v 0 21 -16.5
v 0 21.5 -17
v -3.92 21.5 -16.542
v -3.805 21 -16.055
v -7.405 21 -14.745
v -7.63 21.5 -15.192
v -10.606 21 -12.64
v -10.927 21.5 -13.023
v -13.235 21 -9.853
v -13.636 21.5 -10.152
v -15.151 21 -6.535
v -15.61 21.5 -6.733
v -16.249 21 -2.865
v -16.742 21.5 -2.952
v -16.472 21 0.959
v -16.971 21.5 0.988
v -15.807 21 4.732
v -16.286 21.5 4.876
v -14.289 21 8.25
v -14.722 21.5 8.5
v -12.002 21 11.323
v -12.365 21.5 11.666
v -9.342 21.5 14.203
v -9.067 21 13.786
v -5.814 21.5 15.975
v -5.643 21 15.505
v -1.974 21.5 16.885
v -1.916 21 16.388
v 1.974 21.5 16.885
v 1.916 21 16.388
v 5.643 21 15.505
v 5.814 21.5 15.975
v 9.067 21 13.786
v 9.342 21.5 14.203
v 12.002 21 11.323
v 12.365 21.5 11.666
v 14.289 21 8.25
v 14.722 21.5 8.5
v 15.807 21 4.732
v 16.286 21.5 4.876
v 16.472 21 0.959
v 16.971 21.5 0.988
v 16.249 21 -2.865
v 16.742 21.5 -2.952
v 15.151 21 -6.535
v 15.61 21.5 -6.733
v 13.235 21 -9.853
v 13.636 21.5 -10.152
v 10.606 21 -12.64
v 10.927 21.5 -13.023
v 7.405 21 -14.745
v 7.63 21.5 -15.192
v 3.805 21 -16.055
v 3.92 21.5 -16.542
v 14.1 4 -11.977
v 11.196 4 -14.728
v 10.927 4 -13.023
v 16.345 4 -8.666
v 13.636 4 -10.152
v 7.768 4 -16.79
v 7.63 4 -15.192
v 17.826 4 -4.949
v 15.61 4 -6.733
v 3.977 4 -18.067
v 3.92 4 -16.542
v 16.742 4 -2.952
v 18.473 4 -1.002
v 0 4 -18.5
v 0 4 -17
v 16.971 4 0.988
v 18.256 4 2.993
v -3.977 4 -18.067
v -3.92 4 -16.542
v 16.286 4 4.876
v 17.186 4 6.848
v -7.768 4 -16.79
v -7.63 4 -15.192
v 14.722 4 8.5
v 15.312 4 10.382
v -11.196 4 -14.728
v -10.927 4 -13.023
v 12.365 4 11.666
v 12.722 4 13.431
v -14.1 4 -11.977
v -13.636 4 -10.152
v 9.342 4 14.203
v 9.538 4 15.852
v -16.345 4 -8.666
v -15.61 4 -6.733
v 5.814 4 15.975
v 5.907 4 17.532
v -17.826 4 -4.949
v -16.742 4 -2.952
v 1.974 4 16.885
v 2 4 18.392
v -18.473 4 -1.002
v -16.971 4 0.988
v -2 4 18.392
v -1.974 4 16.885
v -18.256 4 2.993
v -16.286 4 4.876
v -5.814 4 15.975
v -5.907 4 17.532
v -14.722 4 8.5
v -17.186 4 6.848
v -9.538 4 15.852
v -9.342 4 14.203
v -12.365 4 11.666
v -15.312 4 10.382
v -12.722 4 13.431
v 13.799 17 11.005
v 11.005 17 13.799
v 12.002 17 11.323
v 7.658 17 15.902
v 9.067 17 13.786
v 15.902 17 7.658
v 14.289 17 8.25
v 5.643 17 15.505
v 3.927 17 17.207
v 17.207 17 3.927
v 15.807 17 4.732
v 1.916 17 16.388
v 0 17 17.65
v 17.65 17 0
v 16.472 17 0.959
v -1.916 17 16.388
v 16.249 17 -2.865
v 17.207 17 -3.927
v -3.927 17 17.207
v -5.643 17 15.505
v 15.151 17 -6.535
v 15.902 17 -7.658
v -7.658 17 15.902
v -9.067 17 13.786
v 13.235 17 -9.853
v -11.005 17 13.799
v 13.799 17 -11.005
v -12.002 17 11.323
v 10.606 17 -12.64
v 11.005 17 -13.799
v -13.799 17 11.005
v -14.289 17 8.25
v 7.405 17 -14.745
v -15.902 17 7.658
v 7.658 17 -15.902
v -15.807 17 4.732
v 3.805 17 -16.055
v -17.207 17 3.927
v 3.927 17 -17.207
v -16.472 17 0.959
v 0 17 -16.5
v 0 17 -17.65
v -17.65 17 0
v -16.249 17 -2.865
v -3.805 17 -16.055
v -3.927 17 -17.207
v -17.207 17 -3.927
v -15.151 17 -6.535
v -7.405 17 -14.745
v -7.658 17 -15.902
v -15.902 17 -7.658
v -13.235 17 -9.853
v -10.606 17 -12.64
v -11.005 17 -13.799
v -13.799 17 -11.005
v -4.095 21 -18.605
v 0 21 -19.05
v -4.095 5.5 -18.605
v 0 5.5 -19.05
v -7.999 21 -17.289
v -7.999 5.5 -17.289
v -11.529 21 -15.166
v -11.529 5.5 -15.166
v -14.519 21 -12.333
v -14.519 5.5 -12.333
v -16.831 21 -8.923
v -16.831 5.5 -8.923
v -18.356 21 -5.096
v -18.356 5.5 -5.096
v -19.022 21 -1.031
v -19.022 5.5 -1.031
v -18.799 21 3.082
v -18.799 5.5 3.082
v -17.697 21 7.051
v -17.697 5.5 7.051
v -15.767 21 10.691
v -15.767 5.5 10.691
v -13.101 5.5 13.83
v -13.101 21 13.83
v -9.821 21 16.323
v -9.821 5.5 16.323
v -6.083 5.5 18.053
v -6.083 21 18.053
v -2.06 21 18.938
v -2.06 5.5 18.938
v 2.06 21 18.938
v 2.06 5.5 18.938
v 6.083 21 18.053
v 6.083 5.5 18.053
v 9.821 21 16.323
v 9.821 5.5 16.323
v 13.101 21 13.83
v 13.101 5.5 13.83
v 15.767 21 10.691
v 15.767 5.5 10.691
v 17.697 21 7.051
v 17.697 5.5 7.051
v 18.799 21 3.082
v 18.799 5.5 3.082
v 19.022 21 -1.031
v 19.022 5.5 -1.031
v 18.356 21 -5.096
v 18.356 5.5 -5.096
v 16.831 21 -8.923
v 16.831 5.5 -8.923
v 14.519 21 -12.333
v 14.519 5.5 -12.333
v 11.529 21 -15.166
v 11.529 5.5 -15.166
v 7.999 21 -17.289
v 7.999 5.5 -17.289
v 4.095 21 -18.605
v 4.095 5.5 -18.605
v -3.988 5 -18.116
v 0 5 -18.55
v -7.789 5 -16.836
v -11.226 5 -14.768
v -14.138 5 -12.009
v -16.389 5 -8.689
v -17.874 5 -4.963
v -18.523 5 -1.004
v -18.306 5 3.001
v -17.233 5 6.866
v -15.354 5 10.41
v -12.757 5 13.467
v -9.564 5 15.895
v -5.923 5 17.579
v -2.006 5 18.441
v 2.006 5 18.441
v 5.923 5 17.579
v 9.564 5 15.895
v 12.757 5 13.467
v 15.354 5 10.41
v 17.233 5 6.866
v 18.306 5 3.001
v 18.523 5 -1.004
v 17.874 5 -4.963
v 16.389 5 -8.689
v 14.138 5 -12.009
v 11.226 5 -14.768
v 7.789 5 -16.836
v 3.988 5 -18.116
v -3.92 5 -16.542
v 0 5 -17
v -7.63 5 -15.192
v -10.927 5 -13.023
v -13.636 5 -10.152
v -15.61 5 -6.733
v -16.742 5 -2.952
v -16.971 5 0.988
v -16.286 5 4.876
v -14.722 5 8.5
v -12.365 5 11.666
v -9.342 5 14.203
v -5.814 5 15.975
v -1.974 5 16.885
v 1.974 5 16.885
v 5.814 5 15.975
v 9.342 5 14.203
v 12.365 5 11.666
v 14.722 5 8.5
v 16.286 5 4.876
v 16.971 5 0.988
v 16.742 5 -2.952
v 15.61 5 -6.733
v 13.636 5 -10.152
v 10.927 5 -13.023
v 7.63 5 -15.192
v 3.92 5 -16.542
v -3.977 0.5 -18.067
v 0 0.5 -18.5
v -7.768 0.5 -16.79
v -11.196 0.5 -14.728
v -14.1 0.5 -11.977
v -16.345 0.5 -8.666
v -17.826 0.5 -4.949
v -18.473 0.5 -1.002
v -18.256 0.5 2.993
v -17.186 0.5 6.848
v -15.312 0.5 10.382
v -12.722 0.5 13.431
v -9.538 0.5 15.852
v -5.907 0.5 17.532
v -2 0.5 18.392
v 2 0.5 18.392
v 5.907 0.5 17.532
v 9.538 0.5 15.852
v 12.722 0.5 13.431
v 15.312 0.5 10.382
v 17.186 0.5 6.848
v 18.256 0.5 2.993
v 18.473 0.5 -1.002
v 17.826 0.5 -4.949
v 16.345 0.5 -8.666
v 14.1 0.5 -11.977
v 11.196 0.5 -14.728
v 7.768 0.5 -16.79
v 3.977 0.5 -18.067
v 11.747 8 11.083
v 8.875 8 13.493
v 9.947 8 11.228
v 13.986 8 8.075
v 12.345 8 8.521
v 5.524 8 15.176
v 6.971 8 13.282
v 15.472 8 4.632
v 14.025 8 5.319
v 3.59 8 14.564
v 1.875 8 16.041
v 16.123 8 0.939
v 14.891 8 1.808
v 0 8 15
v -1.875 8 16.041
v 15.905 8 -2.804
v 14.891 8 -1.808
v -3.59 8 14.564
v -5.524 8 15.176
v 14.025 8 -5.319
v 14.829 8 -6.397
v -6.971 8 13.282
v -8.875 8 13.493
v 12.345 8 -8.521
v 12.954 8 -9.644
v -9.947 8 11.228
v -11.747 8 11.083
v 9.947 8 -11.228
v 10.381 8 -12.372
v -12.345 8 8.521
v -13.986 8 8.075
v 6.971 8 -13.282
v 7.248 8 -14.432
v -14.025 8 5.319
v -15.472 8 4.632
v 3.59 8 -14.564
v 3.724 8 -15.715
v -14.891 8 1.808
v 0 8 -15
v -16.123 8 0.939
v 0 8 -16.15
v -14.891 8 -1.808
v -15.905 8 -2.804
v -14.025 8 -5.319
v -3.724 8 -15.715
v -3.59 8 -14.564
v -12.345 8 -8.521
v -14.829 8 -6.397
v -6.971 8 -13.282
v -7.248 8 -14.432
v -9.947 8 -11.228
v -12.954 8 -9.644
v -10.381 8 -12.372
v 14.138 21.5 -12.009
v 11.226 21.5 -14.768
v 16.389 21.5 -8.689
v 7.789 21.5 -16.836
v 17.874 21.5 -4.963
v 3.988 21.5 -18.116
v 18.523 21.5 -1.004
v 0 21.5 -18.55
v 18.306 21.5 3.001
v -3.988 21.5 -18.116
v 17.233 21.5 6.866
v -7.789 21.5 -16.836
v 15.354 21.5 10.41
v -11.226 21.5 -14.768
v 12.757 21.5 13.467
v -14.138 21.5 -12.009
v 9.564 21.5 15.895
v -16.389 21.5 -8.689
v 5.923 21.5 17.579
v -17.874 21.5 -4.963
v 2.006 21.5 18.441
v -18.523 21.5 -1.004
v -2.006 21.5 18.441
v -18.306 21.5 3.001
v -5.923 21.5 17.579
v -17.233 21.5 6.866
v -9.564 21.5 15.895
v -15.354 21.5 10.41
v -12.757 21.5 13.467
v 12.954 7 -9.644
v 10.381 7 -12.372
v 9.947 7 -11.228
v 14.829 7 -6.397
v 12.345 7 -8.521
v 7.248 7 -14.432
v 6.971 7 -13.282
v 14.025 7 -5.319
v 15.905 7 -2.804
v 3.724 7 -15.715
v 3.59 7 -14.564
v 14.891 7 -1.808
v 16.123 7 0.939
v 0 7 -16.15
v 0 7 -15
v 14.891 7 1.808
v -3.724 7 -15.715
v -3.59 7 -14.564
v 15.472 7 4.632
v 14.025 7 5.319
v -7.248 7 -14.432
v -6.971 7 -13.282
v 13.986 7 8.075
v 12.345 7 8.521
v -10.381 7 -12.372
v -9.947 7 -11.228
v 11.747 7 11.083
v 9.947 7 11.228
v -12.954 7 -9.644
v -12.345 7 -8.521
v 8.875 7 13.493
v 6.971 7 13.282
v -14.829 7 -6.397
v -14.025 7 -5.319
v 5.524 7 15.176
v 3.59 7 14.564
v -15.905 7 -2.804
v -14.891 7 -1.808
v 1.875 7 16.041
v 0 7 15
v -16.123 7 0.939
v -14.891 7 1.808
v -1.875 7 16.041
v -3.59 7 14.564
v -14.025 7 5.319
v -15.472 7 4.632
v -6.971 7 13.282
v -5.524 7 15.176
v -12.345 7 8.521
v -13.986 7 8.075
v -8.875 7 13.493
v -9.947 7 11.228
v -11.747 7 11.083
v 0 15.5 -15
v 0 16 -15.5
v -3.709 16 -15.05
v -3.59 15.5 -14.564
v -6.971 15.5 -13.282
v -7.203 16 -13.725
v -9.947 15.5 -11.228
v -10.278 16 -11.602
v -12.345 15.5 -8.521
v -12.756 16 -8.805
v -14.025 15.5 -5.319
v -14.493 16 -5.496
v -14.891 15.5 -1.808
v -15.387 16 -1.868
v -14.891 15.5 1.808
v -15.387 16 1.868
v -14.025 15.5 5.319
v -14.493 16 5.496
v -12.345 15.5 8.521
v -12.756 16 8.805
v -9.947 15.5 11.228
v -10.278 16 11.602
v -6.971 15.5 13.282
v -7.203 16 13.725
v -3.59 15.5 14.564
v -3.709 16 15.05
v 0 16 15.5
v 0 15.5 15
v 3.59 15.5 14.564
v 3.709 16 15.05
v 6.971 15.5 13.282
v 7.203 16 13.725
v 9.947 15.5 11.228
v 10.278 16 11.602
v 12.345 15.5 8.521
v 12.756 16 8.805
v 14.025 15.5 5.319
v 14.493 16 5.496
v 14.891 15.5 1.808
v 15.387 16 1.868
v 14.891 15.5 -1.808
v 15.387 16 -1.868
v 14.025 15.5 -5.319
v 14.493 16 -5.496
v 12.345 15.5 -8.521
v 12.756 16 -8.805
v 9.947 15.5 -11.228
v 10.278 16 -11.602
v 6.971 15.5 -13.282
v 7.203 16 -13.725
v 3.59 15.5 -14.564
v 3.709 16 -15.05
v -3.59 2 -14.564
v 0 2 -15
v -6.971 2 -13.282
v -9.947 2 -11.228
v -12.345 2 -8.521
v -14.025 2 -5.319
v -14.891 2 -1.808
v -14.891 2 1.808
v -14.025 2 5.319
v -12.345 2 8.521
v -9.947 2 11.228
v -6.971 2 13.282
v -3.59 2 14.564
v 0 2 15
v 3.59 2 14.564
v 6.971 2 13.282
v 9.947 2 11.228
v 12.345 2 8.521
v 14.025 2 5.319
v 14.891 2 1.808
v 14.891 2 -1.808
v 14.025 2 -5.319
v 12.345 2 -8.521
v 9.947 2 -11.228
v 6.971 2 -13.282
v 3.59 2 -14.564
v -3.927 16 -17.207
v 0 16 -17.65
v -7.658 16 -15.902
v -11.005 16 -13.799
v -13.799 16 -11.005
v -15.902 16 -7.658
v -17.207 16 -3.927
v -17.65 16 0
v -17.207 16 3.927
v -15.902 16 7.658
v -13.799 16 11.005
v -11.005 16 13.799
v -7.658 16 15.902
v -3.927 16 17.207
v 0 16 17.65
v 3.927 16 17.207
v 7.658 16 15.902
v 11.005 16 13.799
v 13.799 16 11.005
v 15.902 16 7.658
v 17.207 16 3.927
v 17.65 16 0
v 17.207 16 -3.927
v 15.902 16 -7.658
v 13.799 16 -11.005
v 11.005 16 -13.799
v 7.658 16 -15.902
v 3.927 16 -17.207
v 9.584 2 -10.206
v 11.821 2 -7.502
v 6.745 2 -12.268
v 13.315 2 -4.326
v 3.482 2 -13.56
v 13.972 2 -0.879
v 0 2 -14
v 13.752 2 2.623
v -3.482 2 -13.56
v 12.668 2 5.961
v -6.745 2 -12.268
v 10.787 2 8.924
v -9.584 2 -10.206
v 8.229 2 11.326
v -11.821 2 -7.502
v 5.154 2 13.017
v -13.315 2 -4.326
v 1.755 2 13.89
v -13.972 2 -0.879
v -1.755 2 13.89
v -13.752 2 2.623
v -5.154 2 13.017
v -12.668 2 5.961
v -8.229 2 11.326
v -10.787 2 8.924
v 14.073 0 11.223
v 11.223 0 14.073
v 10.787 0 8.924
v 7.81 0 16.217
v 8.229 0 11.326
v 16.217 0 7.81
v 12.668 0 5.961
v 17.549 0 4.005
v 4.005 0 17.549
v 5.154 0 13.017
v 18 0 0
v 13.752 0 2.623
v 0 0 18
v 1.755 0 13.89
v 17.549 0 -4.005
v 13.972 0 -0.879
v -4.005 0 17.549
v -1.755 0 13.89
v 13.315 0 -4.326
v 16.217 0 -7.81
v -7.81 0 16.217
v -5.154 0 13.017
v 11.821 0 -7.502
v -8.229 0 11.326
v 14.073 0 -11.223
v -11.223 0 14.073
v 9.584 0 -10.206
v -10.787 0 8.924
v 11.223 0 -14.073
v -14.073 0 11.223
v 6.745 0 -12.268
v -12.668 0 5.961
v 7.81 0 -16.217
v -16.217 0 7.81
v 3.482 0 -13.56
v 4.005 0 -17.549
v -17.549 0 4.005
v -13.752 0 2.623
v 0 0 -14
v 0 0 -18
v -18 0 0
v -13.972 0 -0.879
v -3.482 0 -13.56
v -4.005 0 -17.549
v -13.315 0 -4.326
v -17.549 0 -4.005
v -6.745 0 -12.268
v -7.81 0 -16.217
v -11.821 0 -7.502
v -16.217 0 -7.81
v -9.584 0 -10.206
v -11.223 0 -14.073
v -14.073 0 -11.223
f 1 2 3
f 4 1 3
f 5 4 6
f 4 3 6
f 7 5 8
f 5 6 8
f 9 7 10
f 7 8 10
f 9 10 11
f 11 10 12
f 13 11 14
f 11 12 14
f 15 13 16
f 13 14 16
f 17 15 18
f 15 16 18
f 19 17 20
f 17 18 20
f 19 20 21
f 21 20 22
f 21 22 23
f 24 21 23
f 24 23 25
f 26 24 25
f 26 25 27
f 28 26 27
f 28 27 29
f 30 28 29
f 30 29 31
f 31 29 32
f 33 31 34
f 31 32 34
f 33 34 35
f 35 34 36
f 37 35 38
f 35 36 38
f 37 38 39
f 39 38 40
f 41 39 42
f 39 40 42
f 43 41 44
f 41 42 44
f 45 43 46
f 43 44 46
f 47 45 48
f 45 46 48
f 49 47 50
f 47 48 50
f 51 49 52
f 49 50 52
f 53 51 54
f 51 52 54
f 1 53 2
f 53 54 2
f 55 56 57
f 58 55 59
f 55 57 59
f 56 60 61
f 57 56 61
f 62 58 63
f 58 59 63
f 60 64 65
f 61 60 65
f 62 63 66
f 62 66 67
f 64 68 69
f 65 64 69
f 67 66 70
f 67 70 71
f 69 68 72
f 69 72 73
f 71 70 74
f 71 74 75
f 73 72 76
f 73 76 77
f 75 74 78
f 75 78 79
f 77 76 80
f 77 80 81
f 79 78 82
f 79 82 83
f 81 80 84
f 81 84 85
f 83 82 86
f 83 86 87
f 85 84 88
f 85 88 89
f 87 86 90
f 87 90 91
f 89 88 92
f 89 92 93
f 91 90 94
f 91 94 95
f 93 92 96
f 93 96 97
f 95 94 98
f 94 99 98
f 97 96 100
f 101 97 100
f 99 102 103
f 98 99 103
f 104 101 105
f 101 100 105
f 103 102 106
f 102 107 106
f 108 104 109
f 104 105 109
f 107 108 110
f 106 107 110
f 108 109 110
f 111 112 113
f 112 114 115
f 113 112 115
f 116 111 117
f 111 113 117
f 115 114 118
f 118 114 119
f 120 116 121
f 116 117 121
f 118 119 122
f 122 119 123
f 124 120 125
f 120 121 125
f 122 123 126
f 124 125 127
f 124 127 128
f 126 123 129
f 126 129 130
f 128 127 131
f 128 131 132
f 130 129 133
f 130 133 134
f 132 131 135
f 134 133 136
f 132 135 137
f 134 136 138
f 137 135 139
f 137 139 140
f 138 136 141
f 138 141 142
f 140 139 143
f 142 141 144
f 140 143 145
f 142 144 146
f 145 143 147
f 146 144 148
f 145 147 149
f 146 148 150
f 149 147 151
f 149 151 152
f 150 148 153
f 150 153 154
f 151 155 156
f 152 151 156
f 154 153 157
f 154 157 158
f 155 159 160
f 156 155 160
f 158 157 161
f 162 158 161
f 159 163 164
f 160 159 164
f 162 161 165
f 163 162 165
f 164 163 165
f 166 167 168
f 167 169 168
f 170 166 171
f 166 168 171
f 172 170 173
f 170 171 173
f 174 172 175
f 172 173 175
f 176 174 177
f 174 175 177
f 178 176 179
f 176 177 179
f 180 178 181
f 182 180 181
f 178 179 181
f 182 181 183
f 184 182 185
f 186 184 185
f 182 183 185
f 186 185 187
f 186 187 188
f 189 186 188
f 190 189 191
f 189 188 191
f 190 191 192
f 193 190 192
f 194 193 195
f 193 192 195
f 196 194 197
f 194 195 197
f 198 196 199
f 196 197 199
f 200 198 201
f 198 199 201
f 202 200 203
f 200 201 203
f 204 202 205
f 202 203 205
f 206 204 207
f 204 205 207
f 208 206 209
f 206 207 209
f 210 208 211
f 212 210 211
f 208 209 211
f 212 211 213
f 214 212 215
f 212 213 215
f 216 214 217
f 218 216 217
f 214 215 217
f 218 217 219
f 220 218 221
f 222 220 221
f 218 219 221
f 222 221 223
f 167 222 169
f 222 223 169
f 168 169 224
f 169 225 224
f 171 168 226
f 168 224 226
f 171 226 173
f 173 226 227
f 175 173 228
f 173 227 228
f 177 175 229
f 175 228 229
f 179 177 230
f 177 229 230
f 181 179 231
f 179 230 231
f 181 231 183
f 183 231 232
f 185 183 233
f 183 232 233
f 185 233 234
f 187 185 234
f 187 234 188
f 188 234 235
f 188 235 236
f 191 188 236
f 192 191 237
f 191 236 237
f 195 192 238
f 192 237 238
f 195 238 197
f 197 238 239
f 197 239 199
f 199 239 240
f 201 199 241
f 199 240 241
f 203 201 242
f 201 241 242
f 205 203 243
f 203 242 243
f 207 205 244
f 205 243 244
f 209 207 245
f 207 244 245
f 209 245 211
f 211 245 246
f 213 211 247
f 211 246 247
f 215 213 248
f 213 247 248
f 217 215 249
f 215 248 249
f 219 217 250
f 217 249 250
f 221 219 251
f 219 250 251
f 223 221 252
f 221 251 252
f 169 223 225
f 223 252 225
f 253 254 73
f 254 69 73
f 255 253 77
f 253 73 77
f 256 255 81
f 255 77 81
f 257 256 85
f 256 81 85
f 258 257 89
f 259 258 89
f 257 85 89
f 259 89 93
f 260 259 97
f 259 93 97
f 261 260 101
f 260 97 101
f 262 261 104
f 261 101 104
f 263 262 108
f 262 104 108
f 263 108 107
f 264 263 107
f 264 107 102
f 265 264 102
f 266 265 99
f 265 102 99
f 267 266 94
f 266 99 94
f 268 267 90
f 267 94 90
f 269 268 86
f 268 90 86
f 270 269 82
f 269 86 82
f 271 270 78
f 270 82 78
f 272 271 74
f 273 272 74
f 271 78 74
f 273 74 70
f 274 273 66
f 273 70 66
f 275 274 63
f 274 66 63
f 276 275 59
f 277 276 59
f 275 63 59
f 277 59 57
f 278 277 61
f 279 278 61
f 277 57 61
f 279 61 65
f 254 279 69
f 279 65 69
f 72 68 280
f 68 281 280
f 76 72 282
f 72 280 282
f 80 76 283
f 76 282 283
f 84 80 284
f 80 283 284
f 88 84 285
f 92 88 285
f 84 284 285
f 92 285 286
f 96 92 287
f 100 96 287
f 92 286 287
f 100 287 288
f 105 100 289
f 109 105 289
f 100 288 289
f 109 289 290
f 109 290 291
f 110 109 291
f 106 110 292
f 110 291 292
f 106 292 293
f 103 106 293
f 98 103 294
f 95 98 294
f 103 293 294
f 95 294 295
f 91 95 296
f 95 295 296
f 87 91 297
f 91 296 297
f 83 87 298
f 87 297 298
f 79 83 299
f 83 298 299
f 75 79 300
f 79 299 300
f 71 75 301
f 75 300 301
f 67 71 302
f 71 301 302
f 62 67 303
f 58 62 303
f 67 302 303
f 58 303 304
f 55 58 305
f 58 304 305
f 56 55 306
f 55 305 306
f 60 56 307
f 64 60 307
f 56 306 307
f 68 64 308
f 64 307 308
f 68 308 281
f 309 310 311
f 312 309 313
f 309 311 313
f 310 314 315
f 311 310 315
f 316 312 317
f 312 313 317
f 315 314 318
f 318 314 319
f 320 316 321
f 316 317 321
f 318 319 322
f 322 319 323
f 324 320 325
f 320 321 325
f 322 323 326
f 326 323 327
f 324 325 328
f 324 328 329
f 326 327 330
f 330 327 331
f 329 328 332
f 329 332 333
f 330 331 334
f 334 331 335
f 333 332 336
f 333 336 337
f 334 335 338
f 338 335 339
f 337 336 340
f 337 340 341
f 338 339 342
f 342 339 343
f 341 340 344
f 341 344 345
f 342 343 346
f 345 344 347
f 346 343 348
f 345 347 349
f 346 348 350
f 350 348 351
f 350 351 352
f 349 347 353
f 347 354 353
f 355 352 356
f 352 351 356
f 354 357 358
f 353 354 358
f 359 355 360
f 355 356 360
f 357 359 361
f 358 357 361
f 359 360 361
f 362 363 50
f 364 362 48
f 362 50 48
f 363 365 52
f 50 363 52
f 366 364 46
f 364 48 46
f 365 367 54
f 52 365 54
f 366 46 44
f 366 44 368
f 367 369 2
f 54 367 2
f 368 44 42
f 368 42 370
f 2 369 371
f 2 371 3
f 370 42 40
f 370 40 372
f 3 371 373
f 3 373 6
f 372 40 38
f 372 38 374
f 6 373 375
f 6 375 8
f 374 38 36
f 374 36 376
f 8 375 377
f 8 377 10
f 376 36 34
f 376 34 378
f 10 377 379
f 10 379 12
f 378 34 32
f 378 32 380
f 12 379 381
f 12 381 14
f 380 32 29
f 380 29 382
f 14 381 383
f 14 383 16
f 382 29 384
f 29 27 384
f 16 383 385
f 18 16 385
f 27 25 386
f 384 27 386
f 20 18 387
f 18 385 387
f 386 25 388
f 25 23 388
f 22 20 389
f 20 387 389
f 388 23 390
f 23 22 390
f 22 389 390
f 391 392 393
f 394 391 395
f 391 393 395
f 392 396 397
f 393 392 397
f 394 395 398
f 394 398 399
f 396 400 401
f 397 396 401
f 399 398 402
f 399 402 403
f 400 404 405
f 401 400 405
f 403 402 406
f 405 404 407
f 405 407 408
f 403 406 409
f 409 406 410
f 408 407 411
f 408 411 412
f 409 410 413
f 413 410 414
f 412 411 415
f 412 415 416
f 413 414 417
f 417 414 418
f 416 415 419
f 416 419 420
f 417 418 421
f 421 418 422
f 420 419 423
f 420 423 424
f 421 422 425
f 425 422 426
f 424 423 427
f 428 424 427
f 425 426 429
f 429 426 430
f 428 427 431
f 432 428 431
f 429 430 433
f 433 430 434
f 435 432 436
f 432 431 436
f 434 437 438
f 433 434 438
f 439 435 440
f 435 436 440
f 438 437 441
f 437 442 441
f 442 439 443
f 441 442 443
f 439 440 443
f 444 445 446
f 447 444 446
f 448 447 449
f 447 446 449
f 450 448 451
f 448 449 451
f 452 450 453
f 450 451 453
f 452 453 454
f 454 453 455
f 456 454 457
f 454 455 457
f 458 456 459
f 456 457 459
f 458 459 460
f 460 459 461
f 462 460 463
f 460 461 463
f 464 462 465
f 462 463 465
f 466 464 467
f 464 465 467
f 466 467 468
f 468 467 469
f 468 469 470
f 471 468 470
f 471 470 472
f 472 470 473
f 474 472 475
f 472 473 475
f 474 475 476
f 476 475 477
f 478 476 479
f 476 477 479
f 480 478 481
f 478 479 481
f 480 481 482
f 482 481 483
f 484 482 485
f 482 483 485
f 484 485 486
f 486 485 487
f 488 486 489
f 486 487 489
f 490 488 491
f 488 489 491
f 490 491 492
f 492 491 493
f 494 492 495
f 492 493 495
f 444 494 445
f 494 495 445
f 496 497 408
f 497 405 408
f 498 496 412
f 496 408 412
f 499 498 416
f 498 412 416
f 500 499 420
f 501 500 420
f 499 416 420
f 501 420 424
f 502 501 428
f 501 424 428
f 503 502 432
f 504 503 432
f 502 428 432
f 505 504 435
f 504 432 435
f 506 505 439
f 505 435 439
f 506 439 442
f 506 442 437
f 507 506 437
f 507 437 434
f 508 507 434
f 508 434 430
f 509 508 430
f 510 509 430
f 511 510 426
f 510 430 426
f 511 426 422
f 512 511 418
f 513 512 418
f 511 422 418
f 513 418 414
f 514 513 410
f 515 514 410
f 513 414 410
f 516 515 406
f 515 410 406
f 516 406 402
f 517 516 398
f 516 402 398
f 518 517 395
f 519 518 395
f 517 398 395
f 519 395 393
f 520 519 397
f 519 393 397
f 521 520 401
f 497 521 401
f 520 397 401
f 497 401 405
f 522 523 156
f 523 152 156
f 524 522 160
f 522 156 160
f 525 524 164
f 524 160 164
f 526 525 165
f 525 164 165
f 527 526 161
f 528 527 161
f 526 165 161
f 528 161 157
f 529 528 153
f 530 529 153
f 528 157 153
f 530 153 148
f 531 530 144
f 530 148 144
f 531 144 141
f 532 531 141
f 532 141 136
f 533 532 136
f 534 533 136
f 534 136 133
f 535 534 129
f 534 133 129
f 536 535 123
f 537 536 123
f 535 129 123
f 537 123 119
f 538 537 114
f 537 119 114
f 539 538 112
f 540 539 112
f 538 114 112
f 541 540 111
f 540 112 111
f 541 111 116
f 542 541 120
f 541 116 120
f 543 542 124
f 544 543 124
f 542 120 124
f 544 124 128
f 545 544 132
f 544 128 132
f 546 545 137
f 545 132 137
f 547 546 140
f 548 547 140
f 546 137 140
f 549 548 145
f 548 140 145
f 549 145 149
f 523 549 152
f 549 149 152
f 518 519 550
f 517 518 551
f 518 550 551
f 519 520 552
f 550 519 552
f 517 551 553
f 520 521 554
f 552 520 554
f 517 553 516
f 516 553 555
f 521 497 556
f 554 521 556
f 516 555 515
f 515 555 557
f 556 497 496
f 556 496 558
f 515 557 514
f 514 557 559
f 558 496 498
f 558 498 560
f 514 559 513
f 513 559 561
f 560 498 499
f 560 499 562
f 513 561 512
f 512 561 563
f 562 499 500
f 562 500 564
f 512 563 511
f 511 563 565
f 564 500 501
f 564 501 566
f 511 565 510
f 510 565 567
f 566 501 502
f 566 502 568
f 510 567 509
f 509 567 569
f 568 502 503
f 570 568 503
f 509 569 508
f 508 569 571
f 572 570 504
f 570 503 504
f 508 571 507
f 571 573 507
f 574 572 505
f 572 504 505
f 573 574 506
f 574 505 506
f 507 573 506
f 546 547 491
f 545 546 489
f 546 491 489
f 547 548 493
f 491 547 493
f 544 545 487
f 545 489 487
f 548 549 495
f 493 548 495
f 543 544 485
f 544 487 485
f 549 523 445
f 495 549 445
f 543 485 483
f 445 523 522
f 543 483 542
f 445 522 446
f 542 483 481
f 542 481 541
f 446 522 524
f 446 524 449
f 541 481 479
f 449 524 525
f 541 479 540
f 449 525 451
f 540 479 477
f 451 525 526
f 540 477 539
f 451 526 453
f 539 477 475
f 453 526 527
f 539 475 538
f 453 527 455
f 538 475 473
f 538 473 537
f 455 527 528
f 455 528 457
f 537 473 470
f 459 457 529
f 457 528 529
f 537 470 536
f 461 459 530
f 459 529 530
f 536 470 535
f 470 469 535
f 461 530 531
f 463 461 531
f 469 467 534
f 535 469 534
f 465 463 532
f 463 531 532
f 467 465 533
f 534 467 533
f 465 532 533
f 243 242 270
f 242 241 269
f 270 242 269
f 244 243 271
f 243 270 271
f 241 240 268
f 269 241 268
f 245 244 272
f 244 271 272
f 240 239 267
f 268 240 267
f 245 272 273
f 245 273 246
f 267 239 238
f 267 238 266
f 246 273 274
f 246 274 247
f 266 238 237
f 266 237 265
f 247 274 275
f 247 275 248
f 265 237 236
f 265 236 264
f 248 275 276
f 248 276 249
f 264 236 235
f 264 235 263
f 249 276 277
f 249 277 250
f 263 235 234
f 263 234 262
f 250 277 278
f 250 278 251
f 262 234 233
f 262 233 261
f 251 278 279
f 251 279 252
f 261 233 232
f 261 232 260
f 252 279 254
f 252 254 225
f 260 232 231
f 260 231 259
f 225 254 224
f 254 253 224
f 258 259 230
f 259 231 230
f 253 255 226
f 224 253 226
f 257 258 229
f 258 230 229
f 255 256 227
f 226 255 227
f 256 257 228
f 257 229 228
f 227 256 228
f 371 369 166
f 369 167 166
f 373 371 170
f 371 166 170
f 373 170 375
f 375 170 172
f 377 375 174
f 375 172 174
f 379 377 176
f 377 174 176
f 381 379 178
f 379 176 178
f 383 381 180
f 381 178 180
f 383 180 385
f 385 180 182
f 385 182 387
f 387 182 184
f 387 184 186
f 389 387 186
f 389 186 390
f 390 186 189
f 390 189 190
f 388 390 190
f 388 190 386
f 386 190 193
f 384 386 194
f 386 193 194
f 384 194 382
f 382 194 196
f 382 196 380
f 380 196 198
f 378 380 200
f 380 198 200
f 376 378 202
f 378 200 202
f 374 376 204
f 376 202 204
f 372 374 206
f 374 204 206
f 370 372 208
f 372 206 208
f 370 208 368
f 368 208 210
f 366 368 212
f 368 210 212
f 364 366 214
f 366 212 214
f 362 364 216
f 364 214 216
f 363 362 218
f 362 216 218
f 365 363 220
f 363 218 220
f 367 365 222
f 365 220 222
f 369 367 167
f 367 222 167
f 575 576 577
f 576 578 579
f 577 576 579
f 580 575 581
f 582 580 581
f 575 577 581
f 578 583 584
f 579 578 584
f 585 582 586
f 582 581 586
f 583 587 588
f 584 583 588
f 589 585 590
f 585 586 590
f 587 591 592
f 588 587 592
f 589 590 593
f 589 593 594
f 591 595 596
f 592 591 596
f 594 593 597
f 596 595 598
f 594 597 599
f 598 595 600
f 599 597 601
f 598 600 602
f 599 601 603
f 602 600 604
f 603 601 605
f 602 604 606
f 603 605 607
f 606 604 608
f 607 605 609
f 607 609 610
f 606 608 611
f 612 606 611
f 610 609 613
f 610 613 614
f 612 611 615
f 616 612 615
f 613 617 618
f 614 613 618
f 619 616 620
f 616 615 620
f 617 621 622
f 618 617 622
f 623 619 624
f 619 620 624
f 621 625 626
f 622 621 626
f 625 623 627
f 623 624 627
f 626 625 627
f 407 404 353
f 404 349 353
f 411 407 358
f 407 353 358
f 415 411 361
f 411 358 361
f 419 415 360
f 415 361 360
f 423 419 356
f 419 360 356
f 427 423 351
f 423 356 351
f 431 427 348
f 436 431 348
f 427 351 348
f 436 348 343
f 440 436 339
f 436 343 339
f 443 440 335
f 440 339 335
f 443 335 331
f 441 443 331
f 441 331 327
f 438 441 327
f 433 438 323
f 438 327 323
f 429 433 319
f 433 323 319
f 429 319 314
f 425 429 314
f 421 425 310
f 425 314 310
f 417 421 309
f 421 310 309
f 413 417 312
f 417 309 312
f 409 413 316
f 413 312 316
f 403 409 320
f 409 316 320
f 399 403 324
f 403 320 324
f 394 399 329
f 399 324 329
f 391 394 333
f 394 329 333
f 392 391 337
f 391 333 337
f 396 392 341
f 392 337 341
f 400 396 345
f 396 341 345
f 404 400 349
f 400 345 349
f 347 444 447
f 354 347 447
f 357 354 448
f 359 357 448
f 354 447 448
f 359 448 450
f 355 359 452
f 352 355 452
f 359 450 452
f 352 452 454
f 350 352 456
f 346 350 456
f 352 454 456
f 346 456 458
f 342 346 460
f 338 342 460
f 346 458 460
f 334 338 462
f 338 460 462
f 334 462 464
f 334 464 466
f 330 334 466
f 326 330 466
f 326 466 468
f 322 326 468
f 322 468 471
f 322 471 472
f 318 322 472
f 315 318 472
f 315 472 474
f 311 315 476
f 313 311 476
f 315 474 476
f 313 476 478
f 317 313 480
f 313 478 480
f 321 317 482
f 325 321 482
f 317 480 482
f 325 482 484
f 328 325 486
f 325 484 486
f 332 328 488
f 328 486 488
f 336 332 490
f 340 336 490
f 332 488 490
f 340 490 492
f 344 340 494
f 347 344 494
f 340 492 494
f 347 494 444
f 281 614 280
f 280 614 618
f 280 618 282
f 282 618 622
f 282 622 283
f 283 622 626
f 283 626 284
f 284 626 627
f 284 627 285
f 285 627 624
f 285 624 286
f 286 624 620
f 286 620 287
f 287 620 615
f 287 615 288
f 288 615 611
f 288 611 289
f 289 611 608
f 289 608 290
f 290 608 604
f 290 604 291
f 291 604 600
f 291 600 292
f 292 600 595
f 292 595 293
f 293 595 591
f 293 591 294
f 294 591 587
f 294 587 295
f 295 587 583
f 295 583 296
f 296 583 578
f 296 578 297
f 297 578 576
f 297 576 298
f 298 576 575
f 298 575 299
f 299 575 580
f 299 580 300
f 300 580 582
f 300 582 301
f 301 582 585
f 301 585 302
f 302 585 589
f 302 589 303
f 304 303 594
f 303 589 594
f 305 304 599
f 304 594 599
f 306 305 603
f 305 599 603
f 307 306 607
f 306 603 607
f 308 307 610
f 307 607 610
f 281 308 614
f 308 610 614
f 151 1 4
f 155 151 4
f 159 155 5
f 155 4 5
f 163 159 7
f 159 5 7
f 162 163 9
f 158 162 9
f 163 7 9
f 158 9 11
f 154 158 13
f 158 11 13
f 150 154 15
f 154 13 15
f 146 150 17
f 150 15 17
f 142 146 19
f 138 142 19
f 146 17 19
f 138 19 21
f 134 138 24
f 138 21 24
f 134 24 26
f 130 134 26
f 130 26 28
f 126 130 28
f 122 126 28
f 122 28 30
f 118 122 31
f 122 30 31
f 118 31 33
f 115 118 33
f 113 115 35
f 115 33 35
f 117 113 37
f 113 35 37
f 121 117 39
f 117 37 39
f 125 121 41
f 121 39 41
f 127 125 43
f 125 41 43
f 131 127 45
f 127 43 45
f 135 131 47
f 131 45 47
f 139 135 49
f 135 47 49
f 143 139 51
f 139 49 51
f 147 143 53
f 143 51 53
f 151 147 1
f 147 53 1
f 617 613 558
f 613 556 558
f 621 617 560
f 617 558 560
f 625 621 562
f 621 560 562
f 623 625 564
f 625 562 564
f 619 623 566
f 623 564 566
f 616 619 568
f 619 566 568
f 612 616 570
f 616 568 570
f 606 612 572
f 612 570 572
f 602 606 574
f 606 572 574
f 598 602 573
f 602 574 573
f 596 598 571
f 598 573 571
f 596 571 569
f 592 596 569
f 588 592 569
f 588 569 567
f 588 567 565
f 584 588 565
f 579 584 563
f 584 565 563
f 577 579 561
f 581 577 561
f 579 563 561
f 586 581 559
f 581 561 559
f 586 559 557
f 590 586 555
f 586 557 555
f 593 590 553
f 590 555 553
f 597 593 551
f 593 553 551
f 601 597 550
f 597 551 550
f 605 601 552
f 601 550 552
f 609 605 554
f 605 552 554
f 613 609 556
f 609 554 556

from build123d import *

# Parameters (mm, degrees)
CHAMFER_1_SIZE = 0.5


with BuildPart() as part:
    # 草图1 → 旋转1 (revolve)
    with BuildSketch(Plane.XY, mode=Mode.PRIVATE) as revolve_1_sk:
        Polygon((14, 0), (14, 2), (15, 2), (15, 7), (16.15, 7), (16.15, 8), (15, 8), (15, 16), (17.65, 16), (17.65, 17), (16.5, 17), (16.5, 21.5), (18.55, 21.5), (19.05, 21), (19.05, 5.5), (18.55, 5), (17, 5), (17, 4), (18.5, 4), (18.5, 0.5), (18, 0), align=None)
    revolve(revolve_1_sk.sketch.rotate(Axis((0, 0, 0), (0, 1, 0)), 90), axis=Axis((0, 0, 0), (0, 1, 0)))  # turned: the seam where the file's is

    # 倒角1
    chamfer_1_edges = [part.edges().sort_by_distance(p)[0] for p in [
        (0, 16, 15),
        (0, 21.5, 16.5),
    ]]
    chamfer(chamfer_1_edges, length=CHAMFER_1_SIZE)


solid = part.part
